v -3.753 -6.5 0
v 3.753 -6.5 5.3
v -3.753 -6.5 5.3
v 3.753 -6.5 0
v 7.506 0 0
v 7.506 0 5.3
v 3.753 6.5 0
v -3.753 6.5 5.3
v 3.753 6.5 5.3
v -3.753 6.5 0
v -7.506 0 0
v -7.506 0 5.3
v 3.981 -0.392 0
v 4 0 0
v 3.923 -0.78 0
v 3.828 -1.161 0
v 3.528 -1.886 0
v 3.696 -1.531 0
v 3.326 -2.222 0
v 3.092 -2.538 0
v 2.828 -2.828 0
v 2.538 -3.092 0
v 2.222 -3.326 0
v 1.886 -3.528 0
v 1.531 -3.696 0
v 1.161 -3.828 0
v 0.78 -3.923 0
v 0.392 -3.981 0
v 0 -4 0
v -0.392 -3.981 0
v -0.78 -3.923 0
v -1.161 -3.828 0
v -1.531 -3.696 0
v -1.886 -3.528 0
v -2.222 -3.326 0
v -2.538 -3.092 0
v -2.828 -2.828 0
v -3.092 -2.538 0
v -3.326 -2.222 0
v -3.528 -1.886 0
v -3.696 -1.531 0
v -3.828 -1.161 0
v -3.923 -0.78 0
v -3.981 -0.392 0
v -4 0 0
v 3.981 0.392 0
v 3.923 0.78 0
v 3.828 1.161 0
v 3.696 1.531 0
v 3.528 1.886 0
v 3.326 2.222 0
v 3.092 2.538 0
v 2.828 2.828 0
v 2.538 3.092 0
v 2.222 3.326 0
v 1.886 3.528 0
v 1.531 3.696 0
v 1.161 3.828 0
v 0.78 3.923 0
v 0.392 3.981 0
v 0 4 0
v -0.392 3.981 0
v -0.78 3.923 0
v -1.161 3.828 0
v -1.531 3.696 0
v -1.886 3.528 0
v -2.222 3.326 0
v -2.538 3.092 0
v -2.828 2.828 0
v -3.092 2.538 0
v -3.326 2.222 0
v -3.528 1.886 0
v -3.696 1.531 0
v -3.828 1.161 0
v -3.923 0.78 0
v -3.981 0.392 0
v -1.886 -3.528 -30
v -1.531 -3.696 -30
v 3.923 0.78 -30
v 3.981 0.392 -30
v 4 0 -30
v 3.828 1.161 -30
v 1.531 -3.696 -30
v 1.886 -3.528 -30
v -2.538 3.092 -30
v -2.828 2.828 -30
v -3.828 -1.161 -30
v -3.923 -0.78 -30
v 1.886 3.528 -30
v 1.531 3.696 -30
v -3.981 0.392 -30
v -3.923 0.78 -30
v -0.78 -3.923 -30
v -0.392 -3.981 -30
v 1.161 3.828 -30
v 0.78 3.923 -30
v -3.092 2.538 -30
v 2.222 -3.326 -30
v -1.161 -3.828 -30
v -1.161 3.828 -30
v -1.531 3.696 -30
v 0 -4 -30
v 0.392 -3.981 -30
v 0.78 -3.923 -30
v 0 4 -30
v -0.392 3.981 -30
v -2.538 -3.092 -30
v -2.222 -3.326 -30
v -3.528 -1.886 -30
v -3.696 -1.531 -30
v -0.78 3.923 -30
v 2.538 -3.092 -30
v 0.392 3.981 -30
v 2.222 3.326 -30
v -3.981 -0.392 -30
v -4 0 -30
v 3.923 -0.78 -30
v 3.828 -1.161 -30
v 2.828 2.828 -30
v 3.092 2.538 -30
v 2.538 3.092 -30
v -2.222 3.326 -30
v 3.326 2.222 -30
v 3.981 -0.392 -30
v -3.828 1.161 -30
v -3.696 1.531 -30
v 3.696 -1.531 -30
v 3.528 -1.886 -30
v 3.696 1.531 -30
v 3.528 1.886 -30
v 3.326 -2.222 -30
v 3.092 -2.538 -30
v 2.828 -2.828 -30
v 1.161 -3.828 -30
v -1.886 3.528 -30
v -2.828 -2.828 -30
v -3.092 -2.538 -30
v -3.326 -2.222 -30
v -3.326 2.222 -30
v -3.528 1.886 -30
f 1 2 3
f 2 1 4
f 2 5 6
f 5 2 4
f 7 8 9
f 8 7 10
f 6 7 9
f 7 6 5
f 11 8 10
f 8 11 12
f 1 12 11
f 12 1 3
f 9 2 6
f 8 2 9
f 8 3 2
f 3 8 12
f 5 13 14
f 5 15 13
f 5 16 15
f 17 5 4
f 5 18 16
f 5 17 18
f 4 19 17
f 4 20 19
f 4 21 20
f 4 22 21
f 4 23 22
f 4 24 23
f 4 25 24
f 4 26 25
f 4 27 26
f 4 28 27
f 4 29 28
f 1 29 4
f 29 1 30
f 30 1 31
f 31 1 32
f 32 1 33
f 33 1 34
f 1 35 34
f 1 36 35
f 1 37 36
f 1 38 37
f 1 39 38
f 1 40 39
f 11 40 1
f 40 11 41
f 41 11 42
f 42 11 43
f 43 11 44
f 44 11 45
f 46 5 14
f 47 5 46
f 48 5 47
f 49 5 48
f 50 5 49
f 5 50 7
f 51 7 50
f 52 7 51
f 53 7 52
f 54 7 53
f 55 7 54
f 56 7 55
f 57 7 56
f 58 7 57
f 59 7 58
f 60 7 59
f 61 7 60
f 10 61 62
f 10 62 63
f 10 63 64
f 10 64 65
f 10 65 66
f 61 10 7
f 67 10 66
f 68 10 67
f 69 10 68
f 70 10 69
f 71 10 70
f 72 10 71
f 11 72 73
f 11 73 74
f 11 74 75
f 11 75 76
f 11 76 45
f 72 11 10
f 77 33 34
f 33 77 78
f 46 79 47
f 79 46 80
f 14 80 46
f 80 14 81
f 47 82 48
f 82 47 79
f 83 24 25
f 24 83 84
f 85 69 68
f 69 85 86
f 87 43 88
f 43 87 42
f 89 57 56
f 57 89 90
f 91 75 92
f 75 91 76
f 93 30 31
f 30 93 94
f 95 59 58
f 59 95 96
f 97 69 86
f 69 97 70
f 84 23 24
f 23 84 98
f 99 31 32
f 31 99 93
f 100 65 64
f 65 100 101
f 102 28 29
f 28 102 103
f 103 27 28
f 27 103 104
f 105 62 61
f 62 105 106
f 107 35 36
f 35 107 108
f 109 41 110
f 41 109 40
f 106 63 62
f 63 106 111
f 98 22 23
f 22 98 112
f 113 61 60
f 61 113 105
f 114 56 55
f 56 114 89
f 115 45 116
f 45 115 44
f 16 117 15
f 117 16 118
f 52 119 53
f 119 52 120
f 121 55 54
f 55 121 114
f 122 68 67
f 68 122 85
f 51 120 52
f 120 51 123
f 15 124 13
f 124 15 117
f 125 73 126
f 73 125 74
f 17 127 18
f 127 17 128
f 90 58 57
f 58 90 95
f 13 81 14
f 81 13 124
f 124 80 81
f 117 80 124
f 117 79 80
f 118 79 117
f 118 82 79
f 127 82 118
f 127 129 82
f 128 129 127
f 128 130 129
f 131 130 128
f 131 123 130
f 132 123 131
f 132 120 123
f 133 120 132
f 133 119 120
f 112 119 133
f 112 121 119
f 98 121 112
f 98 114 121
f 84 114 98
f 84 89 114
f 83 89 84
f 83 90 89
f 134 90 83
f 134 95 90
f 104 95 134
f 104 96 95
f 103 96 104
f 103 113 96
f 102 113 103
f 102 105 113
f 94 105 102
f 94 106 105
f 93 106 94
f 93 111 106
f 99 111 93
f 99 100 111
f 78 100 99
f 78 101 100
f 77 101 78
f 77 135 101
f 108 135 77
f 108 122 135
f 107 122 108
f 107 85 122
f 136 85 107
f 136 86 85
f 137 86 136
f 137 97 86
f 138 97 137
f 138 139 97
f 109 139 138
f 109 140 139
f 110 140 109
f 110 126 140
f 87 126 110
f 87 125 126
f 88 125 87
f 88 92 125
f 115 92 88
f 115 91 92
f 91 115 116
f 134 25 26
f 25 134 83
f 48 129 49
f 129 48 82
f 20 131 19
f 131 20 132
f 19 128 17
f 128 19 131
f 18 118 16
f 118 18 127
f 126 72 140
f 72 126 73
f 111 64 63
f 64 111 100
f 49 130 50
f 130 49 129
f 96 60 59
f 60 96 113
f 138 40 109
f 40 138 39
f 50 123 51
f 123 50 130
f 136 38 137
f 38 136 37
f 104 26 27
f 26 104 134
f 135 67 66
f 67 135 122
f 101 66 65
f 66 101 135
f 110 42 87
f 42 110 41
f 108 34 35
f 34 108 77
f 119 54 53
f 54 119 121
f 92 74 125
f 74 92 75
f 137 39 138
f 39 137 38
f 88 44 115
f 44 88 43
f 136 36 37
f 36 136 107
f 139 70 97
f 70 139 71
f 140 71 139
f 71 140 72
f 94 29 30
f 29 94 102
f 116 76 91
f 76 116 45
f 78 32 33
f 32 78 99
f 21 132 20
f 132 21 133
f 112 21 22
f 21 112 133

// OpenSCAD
// M8 六角ボルトモデル
$fn = 64;

// 寸法定義
across_flats = 13;   // 対辺距離 (mm)
head_height  = 5.3;  // 頭部高さ (mm)
shank_dia    = 8;    // シャンク径 (mm)
shank_length = 30;   // シャンク長 (mm)

// 六角形の外接円直径の計算
hex_outer_dia = across_flats / cos(30);

union() {
    // 六角頭部 (z = 0 から z = 5.3 方向)
    cylinder(h = head_height, d = hex_outer_dia, $fn = 6);

    // シャンク部 (z = 0 から z = -30 方向)
    translate([0, 0, -shank_length])
        cylinder(h = shank_length, d = shank_dia);
}
